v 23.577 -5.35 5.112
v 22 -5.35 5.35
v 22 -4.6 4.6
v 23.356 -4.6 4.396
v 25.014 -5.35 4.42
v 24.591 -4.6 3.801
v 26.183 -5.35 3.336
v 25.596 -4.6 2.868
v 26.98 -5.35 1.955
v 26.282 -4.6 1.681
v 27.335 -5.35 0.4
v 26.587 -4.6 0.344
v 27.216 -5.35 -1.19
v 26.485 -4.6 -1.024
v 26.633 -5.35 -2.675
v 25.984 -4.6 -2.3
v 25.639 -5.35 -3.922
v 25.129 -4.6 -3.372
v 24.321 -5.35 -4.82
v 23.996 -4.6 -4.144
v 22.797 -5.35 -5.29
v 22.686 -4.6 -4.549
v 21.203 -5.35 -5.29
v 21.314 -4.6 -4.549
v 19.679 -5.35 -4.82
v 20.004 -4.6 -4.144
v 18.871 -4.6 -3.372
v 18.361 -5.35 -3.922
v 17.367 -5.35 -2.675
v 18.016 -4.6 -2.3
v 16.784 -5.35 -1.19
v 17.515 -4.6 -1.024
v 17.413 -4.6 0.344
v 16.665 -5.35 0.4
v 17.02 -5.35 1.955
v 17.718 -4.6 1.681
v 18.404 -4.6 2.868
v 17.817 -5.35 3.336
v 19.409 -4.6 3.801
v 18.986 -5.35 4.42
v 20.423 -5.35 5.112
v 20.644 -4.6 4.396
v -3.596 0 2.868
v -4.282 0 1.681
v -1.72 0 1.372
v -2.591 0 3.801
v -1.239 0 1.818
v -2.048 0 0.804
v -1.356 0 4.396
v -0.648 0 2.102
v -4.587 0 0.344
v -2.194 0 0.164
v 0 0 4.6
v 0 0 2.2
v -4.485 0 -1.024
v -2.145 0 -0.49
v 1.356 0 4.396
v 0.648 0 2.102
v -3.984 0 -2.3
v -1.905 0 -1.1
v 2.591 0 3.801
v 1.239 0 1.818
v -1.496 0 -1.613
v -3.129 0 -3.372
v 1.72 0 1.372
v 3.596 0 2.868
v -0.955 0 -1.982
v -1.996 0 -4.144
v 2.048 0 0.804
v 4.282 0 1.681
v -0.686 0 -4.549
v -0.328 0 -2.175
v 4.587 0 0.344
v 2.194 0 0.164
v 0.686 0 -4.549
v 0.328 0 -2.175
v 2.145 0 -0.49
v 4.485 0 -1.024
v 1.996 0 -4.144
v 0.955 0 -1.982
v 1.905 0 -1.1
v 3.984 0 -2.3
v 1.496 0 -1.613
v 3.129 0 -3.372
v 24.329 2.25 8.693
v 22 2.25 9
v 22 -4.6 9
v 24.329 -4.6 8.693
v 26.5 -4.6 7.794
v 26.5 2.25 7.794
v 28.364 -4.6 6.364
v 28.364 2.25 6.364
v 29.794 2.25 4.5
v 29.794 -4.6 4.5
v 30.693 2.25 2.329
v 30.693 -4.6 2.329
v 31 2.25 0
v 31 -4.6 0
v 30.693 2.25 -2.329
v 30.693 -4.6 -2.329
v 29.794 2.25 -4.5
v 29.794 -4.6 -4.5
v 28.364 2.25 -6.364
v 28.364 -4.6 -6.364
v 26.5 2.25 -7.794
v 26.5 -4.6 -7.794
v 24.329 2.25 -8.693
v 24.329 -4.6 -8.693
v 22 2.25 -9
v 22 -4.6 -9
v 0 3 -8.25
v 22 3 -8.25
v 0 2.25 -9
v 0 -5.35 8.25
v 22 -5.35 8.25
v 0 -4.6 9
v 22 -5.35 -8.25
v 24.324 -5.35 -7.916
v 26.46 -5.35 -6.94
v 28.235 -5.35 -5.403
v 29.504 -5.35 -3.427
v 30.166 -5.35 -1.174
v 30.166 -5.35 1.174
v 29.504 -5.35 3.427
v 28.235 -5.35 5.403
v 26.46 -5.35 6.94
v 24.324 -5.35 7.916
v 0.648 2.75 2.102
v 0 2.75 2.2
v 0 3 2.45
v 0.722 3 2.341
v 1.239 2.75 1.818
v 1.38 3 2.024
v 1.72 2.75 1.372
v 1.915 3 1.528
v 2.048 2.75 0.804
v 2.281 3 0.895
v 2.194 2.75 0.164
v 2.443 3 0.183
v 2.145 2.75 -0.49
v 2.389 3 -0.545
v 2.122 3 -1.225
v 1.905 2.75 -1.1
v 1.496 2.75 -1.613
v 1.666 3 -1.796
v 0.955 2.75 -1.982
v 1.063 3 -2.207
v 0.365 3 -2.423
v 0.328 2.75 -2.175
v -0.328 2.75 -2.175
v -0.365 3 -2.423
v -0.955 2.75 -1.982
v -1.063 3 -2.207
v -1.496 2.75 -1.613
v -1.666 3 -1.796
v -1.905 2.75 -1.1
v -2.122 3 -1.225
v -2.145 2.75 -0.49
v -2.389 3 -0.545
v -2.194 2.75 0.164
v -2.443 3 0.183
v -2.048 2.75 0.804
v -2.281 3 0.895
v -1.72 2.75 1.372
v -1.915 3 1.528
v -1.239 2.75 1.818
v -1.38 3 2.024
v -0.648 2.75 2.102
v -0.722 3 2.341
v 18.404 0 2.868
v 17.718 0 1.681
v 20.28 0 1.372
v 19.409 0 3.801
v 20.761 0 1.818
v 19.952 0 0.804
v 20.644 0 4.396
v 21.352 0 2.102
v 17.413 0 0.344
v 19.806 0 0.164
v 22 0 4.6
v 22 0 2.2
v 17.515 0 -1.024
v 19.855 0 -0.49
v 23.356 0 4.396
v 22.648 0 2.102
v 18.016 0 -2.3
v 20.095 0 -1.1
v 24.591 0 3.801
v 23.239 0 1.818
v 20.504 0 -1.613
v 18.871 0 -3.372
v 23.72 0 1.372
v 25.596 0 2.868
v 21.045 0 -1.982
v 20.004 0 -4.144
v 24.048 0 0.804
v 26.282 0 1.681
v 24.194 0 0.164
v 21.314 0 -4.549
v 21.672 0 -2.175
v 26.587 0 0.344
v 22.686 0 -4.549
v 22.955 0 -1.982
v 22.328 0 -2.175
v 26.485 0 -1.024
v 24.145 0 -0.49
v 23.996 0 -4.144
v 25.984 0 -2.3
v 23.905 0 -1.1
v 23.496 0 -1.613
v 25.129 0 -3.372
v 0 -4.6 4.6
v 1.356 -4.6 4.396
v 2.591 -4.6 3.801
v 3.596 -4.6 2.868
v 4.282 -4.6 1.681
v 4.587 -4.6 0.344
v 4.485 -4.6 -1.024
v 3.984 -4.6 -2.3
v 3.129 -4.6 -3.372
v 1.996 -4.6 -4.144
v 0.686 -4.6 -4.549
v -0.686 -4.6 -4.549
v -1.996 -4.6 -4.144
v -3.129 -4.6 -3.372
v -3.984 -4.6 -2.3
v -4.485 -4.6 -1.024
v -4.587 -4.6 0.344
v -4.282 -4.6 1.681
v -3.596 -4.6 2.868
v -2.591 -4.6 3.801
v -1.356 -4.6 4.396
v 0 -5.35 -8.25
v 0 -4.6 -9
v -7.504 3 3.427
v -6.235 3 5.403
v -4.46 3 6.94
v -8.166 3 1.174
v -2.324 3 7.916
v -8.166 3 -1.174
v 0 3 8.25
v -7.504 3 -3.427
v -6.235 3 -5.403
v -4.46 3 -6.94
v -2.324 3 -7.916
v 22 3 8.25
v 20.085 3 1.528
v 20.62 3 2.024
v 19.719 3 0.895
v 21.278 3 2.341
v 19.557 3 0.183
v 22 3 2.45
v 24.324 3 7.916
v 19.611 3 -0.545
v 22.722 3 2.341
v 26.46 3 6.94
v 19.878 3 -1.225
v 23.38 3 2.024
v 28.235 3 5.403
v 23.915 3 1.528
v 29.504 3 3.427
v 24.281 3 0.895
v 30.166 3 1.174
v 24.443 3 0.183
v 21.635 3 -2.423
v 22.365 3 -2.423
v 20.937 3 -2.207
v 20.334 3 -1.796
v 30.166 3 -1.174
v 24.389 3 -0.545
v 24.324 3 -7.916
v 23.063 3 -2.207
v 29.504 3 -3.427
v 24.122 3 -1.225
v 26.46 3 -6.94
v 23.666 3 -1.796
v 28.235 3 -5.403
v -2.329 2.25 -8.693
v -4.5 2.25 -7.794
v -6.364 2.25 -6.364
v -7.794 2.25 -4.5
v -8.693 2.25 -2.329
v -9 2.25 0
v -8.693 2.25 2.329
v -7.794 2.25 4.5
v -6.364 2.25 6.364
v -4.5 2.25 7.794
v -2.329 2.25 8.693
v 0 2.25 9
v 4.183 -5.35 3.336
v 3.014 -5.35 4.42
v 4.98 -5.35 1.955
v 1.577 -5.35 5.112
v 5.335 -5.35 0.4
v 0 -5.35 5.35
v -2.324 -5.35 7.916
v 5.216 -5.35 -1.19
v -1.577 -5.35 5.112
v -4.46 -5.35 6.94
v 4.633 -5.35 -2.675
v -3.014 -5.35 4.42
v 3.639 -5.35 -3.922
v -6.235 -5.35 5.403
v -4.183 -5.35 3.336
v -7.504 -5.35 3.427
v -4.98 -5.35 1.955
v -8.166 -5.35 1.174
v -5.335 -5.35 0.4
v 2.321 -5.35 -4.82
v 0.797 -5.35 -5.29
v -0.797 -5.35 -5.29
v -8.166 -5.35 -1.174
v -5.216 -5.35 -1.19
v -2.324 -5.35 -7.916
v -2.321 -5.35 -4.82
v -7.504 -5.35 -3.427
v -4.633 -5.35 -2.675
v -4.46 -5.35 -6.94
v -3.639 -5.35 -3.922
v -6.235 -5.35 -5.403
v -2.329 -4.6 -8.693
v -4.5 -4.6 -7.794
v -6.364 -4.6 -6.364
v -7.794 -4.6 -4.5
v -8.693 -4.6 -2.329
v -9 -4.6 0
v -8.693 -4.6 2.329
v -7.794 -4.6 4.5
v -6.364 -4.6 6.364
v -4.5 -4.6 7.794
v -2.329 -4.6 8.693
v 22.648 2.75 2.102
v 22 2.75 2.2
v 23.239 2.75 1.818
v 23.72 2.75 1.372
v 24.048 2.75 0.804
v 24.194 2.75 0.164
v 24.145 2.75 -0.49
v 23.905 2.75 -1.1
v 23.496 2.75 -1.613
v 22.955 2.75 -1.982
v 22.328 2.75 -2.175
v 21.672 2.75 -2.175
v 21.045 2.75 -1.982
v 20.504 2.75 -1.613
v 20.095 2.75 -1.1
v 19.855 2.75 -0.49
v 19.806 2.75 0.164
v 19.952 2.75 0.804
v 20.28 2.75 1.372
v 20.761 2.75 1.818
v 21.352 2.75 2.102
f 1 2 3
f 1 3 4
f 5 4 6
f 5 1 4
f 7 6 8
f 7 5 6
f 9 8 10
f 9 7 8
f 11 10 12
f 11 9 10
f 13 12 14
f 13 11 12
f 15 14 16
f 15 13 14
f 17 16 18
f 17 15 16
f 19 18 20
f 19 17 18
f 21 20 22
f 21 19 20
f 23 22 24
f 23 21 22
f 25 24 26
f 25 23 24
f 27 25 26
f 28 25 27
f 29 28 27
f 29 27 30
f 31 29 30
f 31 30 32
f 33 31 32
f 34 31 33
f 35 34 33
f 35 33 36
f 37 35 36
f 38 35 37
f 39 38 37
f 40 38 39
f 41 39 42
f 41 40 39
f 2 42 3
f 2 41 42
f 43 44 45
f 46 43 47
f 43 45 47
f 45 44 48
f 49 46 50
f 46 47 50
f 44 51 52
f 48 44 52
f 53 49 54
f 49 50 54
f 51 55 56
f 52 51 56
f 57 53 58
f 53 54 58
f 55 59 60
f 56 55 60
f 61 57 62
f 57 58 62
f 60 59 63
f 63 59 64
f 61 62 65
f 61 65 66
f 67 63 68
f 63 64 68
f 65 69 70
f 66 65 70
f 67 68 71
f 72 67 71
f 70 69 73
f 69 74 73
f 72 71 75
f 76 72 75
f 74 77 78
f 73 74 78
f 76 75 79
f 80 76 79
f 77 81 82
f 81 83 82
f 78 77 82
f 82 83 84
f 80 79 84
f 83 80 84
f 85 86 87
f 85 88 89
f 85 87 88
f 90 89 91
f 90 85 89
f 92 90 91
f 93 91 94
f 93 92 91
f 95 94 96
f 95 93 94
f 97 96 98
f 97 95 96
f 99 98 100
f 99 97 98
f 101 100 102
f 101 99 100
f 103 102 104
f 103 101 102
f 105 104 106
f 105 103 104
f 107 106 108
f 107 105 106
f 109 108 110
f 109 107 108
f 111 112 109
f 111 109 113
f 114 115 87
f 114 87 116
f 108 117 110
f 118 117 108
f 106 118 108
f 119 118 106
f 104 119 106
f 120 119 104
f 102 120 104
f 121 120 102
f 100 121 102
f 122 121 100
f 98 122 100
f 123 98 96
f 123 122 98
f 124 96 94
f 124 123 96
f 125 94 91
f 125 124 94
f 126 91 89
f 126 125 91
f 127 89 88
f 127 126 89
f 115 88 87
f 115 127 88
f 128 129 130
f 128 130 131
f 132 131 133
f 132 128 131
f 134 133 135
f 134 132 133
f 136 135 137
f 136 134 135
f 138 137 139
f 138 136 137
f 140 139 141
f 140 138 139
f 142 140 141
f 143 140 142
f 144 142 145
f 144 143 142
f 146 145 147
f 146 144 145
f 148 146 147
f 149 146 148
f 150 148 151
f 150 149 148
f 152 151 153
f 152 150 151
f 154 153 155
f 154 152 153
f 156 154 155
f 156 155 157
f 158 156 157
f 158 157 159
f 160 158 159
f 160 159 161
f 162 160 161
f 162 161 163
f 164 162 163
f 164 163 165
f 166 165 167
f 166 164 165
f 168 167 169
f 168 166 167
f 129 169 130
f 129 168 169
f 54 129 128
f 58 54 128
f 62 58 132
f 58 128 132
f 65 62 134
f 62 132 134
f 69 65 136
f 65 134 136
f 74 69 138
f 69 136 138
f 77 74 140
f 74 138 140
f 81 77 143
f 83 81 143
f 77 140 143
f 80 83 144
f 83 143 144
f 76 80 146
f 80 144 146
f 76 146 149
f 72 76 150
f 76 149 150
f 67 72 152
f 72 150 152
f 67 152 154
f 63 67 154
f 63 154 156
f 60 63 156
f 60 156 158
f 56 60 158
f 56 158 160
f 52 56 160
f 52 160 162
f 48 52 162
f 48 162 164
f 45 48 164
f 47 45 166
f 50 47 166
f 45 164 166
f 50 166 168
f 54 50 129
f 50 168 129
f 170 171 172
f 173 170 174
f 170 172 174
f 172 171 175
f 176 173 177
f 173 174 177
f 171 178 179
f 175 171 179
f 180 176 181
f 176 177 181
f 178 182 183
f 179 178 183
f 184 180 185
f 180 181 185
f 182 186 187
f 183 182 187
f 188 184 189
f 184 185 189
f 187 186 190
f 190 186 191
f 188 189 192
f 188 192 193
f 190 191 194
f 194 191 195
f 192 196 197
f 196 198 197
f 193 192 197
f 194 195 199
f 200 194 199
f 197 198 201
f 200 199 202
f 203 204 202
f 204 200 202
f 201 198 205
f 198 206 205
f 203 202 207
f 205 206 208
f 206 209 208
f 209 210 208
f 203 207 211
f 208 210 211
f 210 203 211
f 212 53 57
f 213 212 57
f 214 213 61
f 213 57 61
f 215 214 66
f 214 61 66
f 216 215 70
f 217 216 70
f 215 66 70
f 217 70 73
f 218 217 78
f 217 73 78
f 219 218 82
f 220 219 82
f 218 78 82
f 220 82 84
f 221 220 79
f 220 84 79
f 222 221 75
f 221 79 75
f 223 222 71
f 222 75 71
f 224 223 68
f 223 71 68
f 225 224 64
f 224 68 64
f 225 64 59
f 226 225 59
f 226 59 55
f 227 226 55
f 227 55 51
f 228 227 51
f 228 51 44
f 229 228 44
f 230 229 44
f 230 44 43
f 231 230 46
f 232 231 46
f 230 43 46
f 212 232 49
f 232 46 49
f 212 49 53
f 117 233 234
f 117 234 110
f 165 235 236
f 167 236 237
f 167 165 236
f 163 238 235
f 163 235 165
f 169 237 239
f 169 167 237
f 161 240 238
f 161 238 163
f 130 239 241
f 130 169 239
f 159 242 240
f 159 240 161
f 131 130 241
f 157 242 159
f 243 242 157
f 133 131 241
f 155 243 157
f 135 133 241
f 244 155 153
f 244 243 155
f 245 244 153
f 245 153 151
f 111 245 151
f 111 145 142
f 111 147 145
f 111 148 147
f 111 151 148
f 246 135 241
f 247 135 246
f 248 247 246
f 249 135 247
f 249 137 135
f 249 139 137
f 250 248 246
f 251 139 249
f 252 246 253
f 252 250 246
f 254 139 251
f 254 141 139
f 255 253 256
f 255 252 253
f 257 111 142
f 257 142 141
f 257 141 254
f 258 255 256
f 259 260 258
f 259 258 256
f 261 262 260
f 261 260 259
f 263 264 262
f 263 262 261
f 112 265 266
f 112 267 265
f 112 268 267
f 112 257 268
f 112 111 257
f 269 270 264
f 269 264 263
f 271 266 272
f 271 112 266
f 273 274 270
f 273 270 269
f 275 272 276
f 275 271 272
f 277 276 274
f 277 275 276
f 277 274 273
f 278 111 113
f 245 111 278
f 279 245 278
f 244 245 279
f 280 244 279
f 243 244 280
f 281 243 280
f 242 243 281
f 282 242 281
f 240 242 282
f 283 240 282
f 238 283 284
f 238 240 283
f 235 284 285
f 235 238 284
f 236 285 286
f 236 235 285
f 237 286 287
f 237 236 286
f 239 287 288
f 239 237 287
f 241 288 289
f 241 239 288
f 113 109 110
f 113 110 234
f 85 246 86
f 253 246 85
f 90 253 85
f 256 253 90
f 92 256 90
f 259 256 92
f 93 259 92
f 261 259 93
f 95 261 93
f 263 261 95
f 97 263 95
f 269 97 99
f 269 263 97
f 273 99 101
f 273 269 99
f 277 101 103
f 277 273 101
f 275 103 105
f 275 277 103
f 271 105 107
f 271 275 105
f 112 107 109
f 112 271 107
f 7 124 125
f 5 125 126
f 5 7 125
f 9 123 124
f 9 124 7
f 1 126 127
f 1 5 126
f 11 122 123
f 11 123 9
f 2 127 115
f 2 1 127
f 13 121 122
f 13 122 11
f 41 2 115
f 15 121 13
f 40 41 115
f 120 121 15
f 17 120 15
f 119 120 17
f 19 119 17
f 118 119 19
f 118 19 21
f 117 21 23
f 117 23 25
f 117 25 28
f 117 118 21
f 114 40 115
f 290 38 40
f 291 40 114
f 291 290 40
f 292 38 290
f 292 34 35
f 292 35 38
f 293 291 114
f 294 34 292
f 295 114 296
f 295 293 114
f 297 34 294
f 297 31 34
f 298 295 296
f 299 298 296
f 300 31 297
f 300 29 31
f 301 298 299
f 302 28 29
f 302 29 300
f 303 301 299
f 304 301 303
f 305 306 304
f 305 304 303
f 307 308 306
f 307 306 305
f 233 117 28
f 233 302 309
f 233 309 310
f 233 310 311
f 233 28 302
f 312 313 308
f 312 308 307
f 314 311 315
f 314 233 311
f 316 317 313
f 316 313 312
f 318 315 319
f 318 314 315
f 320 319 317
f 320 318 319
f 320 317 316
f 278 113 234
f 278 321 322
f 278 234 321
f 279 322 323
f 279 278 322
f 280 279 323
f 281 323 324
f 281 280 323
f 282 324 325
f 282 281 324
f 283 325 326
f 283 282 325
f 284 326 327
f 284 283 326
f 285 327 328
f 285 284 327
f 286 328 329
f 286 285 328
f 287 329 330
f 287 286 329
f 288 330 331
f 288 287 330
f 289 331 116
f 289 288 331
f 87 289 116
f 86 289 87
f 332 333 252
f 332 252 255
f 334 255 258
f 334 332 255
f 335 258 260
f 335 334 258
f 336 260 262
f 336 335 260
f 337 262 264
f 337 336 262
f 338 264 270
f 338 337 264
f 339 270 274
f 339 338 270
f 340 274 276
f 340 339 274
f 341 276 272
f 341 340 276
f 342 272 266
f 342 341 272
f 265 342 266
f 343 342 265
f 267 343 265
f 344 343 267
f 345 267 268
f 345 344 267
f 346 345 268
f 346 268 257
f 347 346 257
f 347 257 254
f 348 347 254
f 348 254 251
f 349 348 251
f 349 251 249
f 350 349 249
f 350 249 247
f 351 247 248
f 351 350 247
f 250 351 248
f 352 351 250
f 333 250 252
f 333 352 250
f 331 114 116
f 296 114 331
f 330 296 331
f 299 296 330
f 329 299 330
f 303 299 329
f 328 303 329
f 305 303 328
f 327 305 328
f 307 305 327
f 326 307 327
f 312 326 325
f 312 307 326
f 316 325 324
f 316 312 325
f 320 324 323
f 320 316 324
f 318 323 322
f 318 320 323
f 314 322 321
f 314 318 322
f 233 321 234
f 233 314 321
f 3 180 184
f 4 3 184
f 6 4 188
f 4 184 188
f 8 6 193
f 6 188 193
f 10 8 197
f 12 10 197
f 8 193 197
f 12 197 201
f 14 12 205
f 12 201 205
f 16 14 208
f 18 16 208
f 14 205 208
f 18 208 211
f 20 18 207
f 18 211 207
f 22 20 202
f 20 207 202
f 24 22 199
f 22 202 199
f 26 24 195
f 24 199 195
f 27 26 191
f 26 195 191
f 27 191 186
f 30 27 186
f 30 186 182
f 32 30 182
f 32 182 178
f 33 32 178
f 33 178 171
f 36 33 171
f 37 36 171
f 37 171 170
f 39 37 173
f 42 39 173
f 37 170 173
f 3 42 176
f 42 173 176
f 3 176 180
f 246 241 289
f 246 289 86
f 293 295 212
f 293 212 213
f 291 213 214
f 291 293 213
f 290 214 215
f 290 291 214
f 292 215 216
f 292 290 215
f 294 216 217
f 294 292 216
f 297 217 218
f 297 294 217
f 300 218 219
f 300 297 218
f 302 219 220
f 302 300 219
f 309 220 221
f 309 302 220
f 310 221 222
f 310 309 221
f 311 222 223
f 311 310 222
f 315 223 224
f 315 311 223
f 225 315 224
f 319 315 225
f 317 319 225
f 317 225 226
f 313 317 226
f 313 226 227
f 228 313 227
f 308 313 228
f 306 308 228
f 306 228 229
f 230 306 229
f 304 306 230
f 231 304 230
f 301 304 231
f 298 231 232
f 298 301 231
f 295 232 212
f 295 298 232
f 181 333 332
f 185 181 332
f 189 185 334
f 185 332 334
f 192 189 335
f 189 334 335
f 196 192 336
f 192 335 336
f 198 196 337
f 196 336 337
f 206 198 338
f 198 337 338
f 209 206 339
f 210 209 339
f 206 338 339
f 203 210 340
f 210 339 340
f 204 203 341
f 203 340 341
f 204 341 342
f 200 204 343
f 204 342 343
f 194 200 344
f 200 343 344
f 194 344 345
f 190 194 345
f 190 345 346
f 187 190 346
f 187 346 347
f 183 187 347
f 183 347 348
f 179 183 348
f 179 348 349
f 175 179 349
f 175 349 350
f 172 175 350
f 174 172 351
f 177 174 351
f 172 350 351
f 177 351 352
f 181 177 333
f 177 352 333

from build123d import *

# Parameters (mm, degrees)
SKETCH1_R           = 4.6
BOSS_EXTRUDE1_DEPTH = 5.35
BOSS_EXTRUDE2_START = 3
SKETCH1_3_R         = 2.2
BOSS_EXTRUDE2_DEPTH = 3
CHAMFER1_SIZE       = 0.75
CHAMFER2_SIZE       = 0.25


with BuildPart() as part:
    # Sketch1 → Boss-Extrude1 (new body)
    with BuildSketch(Plane(origin=(0, 0, 0), x_dir=(1, 0, 0), z_dir=(0, 1, 0))):
        with BuildLine():
            Line((22, 9), (0, 9))
            ThreePointArc((0, 9), (-9, 0), (0, -9))
            Line((0, -9), (22, -9))
            ThreePointArc((22, -9), (31, 0), (22, 9))
        make_face()
        Circle(SKETCH1_R, mode=Mode.SUBTRACT)
        with Locations((22, 0)):
            Circle(SKETCH1_R, mode=Mode.SUBTRACT)
    extrude(amount=-BOSS_EXTRUDE1_DEPTH)

    # Sketch1<3> → Boss-Extrude2 (add)
    with BuildSketch(Plane(origin=(0, 0, 0), x_dir=(1, 0, 0), z_dir=(0, 1, 0)).offset(BOSS_EXTRUDE2_START)):
        with BuildLine():
            Line((22, 9), (0, 9))
            ThreePointArc((0, 9), (-9, 0), (0, -9))
            Line((0, -9), (22, -9))
            ThreePointArc((22, -9), (31, 0), (22, 9))
        make_face()
        Circle(SKETCH1_3_R, mode=Mode.SUBTRACT)
        with Locations((22, 0)):
            Circle(SKETCH1_3_R, mode=Mode.SUBTRACT)
    extrude(amount=-BOSS_EXTRUDE2_DEPTH)

    # Chamfer1
    chamfer1_edges = [part.edges().sort_by_distance(p)[0] for p in [
        (17.4, -5.35, 0),
        (-4.6, -5.35, 0),
        (11, -5.35, -9),
        (-9, -5.35, 0),
        (31, -5.35, 0),
        (11, -5.35, 9),
        (11, 3, -9),
        (-9, 3, 0),
        (31, 3, 0),
        (11, 3, 9),
    ]]
    chamfer(chamfer1_edges, length=CHAMFER1_SIZE)

    # Chamfer2
    chamfer2_edges = [part.edges().sort_by_distance(p)[0] for p in [
        (19.8, 3, 0),
        (-2.2, 3, 0),
    ]]
    chamfer(chamfer2_edges, length=CHAMFER2_SIZE)


solid = part.part
